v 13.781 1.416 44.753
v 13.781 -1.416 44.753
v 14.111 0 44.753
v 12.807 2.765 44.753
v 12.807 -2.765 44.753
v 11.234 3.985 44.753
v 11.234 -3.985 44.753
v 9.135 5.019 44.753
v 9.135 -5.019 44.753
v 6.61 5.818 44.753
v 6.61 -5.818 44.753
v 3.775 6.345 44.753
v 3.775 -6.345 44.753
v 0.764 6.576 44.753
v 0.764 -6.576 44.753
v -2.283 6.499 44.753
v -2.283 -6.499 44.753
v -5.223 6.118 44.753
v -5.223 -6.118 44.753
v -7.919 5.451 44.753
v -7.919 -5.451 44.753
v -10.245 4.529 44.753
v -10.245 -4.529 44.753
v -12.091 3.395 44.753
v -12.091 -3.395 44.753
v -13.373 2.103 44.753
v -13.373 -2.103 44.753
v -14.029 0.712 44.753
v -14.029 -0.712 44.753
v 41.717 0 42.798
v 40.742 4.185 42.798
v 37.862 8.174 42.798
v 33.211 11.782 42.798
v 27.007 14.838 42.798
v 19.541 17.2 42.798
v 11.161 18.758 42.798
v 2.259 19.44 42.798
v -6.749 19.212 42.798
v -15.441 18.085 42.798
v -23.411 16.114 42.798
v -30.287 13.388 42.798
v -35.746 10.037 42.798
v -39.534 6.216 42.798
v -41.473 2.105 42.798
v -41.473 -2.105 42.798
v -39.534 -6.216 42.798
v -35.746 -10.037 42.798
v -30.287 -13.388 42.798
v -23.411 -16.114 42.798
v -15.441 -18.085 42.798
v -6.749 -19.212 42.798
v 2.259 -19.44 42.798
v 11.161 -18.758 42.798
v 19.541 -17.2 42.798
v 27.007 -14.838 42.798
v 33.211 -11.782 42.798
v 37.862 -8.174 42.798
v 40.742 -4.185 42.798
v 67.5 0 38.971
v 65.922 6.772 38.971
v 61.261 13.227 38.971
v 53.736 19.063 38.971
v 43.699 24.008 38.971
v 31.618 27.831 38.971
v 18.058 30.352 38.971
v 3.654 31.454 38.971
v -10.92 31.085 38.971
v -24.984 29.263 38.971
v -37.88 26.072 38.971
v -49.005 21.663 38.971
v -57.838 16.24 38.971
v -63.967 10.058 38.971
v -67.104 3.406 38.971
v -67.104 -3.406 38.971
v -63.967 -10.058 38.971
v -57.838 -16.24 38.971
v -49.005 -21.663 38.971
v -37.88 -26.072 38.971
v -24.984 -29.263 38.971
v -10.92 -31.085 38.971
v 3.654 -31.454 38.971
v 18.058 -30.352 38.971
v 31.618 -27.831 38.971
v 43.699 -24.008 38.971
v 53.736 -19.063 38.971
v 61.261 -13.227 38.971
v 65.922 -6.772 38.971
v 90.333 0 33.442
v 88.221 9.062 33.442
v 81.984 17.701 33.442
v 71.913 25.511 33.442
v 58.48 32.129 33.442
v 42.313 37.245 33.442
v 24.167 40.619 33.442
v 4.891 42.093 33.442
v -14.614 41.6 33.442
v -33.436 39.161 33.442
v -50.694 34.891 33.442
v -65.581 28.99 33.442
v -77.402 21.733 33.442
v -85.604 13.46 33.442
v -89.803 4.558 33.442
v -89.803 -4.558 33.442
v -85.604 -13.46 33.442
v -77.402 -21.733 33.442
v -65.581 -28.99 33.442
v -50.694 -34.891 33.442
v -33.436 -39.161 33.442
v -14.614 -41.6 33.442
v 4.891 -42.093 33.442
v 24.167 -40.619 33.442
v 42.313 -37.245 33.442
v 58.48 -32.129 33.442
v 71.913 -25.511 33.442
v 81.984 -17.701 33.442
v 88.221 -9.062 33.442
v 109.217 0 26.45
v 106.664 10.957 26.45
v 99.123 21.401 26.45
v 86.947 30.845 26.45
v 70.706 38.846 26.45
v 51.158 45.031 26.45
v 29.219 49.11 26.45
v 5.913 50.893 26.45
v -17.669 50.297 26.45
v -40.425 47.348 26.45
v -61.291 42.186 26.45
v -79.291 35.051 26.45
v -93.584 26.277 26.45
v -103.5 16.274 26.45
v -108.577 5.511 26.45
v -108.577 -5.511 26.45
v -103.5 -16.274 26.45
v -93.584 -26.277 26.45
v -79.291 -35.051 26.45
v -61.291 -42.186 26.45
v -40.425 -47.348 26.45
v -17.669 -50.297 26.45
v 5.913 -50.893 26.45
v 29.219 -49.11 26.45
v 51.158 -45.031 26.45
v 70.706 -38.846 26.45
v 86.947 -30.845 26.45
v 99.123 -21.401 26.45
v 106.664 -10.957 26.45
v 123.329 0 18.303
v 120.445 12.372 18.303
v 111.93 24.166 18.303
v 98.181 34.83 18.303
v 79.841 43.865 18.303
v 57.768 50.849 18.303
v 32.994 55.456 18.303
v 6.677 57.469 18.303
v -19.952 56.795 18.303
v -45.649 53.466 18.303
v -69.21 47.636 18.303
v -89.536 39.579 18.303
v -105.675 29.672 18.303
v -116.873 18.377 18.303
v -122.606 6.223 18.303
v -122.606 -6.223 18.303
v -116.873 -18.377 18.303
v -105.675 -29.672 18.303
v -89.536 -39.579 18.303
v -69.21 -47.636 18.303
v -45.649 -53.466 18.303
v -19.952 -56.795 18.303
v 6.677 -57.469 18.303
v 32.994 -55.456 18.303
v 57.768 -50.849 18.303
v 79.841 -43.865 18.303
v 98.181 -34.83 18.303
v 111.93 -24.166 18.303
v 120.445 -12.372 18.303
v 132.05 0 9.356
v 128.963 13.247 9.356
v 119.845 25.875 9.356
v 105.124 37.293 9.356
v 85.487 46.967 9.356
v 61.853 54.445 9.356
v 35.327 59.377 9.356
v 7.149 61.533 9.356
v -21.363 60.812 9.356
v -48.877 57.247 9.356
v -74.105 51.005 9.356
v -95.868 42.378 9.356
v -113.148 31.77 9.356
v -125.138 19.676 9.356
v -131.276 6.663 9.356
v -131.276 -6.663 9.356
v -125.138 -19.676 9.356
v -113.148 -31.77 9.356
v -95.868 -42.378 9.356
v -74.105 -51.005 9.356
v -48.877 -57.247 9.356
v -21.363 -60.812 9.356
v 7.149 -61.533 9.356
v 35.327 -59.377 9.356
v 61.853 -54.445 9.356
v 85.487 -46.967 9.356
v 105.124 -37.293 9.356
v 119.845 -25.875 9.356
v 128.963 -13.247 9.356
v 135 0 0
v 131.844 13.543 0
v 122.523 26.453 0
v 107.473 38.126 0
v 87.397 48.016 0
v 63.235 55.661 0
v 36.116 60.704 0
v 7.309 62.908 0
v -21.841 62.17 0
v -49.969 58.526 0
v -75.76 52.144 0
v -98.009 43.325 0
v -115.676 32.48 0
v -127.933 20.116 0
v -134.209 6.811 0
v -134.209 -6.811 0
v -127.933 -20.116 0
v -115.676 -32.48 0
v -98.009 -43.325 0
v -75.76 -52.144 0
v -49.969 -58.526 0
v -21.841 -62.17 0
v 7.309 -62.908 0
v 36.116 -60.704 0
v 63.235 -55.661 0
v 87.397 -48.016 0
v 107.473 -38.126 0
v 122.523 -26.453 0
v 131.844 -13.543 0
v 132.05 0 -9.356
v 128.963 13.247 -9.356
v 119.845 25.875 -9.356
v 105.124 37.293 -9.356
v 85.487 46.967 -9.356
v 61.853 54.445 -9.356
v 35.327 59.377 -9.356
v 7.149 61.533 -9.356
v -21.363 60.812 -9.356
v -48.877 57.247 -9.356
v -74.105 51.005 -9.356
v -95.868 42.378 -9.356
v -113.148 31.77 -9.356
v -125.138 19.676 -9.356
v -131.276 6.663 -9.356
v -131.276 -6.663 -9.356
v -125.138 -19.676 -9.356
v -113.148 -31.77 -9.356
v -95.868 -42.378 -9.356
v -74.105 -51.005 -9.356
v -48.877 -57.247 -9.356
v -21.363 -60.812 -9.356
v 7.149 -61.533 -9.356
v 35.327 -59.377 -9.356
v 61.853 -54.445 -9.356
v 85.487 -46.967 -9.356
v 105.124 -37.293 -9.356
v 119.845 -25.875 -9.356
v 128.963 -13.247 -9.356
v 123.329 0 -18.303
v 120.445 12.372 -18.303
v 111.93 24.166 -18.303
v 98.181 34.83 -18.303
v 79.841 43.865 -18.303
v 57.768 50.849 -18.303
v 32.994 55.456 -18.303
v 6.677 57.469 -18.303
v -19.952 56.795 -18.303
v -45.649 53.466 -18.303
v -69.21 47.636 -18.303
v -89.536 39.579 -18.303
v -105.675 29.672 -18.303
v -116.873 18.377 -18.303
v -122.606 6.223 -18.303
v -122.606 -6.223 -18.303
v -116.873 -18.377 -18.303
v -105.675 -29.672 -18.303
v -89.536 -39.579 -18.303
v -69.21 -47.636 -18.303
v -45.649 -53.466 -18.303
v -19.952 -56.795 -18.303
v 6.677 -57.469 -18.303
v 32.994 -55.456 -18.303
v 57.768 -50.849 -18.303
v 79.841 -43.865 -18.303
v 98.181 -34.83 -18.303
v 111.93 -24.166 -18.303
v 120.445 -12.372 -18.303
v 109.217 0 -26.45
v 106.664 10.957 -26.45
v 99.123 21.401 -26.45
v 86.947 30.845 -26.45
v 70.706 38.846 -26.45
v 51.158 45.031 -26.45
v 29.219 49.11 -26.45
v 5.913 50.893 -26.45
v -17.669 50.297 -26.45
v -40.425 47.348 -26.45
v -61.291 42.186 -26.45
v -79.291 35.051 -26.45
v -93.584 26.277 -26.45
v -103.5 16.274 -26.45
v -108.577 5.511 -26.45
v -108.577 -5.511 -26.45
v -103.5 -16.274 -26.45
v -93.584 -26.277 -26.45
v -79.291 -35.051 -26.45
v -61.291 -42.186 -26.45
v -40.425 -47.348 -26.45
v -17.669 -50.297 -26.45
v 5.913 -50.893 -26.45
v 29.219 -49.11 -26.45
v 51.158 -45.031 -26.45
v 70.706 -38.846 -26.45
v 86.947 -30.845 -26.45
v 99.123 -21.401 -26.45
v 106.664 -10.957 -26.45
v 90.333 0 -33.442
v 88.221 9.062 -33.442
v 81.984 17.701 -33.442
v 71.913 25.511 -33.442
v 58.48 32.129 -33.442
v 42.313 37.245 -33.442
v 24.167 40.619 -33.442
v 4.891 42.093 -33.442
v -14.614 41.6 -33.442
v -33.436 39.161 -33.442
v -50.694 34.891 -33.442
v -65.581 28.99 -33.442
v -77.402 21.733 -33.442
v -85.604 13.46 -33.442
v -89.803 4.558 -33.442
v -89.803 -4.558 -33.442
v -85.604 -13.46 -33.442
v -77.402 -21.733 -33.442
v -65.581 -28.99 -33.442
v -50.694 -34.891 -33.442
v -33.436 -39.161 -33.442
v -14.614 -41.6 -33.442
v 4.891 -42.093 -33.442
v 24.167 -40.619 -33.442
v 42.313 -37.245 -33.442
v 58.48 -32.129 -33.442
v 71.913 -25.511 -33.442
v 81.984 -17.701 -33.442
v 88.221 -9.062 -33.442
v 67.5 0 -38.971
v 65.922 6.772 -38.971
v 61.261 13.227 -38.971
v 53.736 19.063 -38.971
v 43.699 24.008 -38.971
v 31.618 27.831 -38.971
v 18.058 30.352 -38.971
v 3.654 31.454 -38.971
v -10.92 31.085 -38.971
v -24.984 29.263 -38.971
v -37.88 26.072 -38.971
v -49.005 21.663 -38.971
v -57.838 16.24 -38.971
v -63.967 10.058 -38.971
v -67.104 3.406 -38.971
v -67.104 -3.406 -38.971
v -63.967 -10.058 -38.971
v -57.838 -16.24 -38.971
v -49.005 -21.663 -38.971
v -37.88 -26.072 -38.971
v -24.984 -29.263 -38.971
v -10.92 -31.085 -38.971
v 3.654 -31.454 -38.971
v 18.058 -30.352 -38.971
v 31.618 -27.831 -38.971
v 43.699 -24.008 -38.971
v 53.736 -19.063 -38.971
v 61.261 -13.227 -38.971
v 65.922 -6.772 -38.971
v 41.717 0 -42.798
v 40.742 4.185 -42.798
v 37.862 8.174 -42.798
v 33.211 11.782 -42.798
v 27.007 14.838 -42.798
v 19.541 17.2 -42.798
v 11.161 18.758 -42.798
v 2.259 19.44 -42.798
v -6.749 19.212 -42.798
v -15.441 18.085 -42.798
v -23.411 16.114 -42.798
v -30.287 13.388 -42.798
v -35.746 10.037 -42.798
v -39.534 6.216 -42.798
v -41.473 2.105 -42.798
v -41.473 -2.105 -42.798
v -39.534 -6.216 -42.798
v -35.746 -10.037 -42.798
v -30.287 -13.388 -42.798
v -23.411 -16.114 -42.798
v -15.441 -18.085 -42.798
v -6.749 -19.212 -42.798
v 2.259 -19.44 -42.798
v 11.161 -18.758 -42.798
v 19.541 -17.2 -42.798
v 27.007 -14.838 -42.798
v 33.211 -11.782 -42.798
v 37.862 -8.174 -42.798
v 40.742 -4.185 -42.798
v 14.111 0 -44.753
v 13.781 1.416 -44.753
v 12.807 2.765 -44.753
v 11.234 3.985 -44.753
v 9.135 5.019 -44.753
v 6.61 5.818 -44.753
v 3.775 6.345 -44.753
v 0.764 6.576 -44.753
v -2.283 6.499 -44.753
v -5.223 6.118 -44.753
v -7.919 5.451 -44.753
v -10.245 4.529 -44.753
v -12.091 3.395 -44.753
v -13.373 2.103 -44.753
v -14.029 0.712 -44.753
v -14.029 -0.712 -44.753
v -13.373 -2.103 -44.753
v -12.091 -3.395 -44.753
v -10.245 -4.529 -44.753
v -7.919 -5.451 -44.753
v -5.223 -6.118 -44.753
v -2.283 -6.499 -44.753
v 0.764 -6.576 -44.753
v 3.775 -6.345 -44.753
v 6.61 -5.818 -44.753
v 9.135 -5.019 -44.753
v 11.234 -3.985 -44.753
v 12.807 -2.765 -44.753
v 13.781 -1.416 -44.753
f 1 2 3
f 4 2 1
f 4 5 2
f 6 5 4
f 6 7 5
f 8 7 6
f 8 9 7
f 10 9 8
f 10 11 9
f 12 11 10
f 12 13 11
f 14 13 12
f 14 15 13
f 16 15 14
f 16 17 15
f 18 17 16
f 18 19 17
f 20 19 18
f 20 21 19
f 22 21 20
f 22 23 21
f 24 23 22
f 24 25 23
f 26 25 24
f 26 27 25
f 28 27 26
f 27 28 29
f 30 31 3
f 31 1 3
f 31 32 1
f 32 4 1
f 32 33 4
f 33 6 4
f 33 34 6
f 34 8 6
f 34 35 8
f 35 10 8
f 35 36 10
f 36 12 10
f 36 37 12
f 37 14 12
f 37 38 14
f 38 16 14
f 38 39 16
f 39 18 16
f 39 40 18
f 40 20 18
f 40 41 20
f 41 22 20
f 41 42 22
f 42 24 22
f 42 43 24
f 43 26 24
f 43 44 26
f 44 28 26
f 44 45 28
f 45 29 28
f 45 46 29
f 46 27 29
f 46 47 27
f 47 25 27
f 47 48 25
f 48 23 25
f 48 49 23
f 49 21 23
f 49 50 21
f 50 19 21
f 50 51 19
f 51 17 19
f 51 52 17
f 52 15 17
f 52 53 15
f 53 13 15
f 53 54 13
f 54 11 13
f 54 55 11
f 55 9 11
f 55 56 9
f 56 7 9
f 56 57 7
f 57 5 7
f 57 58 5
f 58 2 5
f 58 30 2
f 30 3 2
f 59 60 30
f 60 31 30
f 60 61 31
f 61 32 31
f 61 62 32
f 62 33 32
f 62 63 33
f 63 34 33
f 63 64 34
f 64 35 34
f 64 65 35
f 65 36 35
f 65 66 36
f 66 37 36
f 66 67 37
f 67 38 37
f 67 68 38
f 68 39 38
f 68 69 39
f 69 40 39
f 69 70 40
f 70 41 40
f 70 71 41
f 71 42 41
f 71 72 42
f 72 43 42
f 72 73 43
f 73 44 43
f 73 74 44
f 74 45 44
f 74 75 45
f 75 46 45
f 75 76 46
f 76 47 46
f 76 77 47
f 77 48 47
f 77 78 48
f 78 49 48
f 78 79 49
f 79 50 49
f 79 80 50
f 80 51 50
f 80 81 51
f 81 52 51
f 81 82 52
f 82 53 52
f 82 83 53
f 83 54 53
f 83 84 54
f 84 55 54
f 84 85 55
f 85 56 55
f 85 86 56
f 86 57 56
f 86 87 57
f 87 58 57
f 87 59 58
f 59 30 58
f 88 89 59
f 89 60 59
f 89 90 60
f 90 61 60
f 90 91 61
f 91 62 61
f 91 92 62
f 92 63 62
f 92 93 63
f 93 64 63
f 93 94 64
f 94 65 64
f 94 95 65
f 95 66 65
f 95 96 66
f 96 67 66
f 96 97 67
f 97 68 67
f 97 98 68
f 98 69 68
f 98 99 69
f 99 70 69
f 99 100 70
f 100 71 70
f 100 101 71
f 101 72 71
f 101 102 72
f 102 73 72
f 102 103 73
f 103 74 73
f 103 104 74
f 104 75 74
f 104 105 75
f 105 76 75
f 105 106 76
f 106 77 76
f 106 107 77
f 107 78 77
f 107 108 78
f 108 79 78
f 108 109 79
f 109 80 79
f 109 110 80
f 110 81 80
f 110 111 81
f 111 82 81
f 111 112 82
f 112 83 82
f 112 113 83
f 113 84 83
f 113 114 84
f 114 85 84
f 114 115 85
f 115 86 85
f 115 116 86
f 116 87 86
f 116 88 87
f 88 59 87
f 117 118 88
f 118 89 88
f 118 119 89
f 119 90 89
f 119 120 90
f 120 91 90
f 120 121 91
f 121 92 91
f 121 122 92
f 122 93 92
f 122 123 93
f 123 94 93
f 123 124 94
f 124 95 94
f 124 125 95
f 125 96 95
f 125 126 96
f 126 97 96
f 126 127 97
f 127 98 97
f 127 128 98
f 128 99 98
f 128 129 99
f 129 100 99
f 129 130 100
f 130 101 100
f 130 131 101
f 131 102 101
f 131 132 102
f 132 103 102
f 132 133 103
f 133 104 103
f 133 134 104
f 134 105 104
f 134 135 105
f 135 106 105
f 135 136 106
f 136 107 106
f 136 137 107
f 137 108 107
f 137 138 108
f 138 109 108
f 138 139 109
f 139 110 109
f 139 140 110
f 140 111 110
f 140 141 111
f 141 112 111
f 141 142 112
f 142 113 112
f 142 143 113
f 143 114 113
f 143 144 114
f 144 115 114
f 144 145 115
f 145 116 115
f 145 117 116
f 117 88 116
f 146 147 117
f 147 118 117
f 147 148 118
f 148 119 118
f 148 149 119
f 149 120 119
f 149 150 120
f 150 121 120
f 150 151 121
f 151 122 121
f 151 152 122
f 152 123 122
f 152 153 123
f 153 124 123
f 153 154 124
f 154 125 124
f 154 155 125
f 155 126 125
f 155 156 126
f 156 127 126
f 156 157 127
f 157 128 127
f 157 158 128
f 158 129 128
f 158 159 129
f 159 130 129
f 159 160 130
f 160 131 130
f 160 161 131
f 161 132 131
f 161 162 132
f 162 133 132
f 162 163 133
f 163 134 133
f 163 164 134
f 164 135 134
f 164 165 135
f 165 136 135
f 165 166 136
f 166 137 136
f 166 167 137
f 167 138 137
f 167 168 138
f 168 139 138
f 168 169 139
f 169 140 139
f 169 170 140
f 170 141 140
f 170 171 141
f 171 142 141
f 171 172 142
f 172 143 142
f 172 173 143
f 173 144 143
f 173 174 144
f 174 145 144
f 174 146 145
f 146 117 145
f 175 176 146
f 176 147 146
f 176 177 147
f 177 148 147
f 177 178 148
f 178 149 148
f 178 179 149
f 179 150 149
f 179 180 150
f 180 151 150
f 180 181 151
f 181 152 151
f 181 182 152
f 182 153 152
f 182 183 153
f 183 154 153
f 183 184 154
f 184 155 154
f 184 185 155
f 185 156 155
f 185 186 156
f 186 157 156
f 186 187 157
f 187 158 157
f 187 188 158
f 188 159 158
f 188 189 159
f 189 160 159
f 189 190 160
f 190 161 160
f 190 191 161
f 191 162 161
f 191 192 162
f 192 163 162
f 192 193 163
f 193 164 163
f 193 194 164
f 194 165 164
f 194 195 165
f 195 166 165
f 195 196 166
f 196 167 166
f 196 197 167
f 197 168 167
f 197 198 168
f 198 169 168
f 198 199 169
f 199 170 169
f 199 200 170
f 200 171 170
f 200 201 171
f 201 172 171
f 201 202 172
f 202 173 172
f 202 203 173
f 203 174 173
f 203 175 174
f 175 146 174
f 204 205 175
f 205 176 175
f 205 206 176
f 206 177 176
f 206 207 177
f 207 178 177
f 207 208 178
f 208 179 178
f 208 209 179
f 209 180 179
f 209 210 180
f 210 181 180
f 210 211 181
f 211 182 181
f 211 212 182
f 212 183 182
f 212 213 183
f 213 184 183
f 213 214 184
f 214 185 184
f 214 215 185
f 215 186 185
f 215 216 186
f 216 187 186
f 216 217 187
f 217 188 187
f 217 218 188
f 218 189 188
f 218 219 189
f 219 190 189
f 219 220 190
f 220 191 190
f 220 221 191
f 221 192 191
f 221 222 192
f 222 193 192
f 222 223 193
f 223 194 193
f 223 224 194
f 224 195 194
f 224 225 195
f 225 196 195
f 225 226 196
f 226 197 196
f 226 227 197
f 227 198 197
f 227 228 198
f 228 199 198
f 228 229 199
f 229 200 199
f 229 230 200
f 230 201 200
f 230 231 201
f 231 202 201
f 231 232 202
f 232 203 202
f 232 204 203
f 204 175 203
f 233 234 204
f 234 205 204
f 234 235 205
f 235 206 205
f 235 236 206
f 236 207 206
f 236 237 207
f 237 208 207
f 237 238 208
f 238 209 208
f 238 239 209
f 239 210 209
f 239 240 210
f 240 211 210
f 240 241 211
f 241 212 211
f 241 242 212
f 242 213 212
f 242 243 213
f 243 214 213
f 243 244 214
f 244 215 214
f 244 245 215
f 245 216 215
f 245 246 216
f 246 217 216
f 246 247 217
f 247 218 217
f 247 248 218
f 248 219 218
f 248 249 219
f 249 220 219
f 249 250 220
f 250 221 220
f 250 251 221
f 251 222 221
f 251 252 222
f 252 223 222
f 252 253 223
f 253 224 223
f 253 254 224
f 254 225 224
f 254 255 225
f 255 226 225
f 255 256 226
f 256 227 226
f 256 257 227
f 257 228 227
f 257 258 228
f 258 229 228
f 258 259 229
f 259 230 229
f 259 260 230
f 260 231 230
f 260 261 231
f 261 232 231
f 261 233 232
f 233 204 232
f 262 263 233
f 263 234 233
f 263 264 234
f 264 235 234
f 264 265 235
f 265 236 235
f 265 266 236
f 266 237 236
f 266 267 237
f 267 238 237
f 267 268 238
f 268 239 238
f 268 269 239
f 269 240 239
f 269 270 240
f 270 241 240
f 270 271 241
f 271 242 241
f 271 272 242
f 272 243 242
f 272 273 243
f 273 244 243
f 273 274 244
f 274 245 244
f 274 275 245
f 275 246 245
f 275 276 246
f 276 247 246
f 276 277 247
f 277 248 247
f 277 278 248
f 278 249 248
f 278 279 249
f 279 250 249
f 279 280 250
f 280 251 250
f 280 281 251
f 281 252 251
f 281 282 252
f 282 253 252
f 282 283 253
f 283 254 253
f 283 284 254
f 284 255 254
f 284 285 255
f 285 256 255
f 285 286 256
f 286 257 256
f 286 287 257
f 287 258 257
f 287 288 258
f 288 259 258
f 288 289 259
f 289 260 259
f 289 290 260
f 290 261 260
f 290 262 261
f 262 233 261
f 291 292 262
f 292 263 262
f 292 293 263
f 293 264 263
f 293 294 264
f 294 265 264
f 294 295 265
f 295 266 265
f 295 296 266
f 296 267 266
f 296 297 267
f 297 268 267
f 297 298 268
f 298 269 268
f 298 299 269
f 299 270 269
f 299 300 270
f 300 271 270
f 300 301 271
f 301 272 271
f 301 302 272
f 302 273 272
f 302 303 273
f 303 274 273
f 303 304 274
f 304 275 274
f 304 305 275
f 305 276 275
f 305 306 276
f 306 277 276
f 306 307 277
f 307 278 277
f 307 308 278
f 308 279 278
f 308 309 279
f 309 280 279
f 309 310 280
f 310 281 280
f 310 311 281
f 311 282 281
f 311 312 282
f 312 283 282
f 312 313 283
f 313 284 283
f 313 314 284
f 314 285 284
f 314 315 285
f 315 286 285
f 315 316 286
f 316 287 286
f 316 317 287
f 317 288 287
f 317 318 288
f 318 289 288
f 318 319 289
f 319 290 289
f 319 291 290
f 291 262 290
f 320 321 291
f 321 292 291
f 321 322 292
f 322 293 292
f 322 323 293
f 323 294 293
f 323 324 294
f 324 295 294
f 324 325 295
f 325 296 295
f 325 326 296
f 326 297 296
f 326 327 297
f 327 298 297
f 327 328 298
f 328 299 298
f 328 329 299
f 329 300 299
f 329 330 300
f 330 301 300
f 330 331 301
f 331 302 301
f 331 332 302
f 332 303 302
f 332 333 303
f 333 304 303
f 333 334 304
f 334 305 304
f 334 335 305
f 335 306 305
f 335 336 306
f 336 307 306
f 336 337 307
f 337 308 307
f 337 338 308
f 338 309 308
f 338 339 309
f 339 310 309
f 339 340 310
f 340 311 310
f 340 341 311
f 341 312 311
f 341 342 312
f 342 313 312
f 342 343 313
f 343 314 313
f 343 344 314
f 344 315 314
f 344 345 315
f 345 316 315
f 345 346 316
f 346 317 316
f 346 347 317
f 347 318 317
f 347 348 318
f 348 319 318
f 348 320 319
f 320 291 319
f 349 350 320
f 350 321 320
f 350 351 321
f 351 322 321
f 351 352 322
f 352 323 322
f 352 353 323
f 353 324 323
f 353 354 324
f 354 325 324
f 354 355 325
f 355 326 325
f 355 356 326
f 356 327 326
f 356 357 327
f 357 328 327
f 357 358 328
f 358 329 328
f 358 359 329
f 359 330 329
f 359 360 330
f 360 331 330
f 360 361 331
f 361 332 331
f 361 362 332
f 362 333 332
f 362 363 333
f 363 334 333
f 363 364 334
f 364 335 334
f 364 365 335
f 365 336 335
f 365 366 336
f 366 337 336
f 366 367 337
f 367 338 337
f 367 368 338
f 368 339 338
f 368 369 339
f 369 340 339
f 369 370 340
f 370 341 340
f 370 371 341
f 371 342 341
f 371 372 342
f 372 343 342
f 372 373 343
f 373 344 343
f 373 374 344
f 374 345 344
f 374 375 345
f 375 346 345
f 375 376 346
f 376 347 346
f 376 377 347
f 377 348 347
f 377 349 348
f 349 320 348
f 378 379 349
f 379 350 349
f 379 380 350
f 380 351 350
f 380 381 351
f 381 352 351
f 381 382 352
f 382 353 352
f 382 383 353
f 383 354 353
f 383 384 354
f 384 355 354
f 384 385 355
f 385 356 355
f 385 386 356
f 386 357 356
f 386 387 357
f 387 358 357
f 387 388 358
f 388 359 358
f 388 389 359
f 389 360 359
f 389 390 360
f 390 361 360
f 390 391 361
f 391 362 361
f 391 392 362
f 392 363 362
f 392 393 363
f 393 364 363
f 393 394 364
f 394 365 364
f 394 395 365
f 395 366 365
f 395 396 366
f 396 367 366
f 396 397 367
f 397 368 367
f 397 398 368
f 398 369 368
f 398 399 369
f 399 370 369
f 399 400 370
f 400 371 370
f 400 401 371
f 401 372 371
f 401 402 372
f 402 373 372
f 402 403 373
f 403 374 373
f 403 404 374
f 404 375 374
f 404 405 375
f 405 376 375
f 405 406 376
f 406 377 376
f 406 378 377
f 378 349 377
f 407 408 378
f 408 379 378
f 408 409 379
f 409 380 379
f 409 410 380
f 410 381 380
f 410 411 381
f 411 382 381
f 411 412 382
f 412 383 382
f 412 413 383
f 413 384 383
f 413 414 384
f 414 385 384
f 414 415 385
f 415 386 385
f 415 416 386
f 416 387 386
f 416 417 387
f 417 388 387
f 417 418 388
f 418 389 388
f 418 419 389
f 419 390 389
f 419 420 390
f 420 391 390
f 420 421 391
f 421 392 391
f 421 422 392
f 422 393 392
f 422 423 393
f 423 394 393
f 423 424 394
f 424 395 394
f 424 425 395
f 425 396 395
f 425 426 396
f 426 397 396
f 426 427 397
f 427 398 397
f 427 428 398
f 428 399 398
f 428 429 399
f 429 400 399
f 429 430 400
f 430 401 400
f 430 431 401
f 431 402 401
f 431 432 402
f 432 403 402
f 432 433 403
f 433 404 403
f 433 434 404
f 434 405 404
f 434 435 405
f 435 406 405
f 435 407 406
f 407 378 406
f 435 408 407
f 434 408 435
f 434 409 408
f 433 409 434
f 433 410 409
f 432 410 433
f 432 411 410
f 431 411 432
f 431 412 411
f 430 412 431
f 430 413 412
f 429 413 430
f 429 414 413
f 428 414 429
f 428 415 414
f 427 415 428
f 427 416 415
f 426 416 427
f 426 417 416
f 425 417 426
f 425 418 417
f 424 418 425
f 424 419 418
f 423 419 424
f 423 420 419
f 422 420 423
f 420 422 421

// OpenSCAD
// Generated by SolidPython 1.0.1 on 2020-07-29 00:46:51


scale(v = [15, 7, 5]) {
	sphere(r = 9);
}
/***********************************************
*********      SolidPython code:      **********
************************************************
 
# import packages: SolidPython
from solid import *
from solid.utils import *
from itertools import chain, combinations, permutations


class Resize:

    def __init__(self, scad_file):
        self.scad_file = scad_file
        #self.scad_file = import_scad(scad_file)
        # cone/cylinder param:
        self.r1 = 0
        self.r2 = 0
        self.h = 0
        # rectangular prism param:
        self.w = 0
        self.l = 0
        # ellipse param:
        self.r = 0

    # import OpenScad code (file name corresponds to shape)


    # classify shape + parameters
    def assign(self, param1, param2, param3):
        if self.scad_file == 'cone.scad':
            self.r1 = param1
            self.r2 = param2
            self.h = param3
        elif self.scad_file == 'cylinder.scad':
            self.r1 = param1
            self.r2 = param2
            self.h = param3
        elif self.scad_file == 'rectangularPrism.scad':
            self.h = param1
            self.l = param2
            self.w = param3
        else:
            self.r = param1
            self.h = param2

    # resize parameters
    def iterate(self):
        x = range(3, 20, 2)
        i = 1
        if self.scad_file == 'cone.scad':
            tempList = list(permutations(x, 2))
            for temp in tempList:
                param1 = temp[0]
                param2 = temp[1]
                filepath = 'produced_scad_files/' + 'cone' + str(param1) + '_' + str(param2) + '_' + '.scad'
                scad_render_to_file(cylinder(h=param1, r1=param2, r2=0), filepath)

        elif self.scad_file == 'cylinder.scad':
            tempList = list(permutations(x, 3))
            for temp in tempList:
                param1 = temp[0]
                param2 = temp[1]
                filepath = 'produced_scad_files/' + 'cylinder' + str(param1) + '_' + str(param2) + '_' + '.scad'
                scad_render_to_file(cylinder(h=param1, r1=param2, r2=param2), filepath)

        elif self.scad_file == 'rectangularPrism.scad':
            tempList = list(permutations(x, 3))
            for temp in tempList:
                param1 = temp[0]
                param2 = temp[1]
                param3 = temp[2]
                filepath = 'produced_scad_files/' + 'rectangularPrism' + str(param1) + '_' + str(param2) + '_' + str(
                    param3) + '.scad'
                scad_render_to_file(cube(size=(param1, param2, param3)), filepath)

        elif self.scad_file == 'ellipse.scad':
            tempList = list(permutations(x, 4))
            for temp in tempList:
                param1 = temp[0]
                param2 = temp[1]
                param3 = temp[2]
                param4 = temp[3]
                filepath = 'produced_scad_files/' + 'ellipse' + str(param1) + '_' + str(param2) + '_' + str(param3) + '_' + str(param4) + '.scad'
                scad_render_to_file(scale([param1, param2, param3])(sphere(r=param4)), filepath)

    def render_to_scadfile(self):
        scad_render_to_file(scad, 'example.scad') 
 
************************************************/
